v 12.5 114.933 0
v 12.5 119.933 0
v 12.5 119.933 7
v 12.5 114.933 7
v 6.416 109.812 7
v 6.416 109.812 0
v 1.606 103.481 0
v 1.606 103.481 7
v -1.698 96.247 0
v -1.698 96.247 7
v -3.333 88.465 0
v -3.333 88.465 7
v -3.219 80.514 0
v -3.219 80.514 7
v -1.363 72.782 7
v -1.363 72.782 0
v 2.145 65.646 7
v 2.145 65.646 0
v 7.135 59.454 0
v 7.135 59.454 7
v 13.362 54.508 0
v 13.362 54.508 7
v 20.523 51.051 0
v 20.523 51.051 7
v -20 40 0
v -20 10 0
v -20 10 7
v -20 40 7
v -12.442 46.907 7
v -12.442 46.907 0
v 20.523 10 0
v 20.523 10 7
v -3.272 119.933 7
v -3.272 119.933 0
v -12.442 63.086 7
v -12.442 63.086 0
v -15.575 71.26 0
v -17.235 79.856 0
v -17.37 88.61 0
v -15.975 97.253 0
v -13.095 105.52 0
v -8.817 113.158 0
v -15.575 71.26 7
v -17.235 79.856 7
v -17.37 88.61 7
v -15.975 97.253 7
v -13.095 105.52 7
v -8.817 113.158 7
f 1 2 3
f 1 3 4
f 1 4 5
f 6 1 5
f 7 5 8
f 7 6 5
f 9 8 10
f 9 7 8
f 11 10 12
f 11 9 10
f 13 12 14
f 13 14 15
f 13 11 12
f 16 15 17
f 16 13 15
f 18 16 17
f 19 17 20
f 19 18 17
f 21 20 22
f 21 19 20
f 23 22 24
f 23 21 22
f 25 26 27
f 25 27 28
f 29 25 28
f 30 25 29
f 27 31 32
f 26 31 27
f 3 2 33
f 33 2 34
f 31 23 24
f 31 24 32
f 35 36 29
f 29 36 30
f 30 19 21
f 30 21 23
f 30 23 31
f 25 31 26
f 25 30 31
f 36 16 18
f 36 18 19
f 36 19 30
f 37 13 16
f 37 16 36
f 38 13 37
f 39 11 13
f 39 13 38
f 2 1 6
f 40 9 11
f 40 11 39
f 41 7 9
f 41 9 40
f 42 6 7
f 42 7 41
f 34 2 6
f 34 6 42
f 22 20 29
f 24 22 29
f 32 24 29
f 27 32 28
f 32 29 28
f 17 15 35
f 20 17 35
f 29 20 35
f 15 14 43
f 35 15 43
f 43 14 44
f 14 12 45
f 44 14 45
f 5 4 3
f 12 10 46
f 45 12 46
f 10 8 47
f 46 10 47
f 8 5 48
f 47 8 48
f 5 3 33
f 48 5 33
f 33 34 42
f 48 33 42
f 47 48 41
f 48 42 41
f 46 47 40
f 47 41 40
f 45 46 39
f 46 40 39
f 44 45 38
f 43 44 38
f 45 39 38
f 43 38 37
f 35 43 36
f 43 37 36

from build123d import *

# Parameters (mm, degrees)
CYLINDER002_R     = 0.5
CYLINDER002_DEPTH = 15
PAD001_DEPTH      = 7


with BuildPart() as fixation_servo:
    # Cylinder002 → Cylinder002 (new body)
    with BuildSketch(Plane(origin=(38, 30, 0), x_dir=(1, 0, 0), z_dir=(0, 0, 1))):
        Circle(CYLINDER002_R)
    extrude(amount=CYLINDER002_DEPTH)


with BuildPart() as part_mirroring001:
    # Part__Mirroring001: instance of fixation_servo
    add(fixation_servo.part.mirror(Plane(origin=(0, 0, 0), x_dir=(0, -1, 0), z_dir=(1, 0, 0))))


with BuildPart() as cut004:
    # Sketch001 → Pad001 (new body)
    with BuildSketch(Plane.XY):
        with BuildLine():
            Line((20.522763, 10), (-20, 10))
            Line((-20, 10), (-20, 40))
            Line((-20, 40), (-12.44178, 46.907085))
            Line((-12.44178, 63.085703), (-12.44178, 46.907085))
            ThreePointArc((-3.272439, 119.933259), (-16.862004, 92.961944), (-12.44178, 63.085703))
            Line((12.5, 119.933259), (-3.272439, 119.933259))
            Line((12.5, 119.933259), (12.5, 114.933259))
            ThreePointArc((12.5, 114.933259), (-3.21942, 80.514127), (20.522763, 51.050835))
            Line((20.522763, 51.050835), (20.522763, 10))
        make_face()
    extrude(amount=PAD001_DEPTH)

    # Cut004: cut Part__Mirroring001
    add(part_mirroring001.part, mode=Mode.SUBTRACT)


solid = cut004.part
